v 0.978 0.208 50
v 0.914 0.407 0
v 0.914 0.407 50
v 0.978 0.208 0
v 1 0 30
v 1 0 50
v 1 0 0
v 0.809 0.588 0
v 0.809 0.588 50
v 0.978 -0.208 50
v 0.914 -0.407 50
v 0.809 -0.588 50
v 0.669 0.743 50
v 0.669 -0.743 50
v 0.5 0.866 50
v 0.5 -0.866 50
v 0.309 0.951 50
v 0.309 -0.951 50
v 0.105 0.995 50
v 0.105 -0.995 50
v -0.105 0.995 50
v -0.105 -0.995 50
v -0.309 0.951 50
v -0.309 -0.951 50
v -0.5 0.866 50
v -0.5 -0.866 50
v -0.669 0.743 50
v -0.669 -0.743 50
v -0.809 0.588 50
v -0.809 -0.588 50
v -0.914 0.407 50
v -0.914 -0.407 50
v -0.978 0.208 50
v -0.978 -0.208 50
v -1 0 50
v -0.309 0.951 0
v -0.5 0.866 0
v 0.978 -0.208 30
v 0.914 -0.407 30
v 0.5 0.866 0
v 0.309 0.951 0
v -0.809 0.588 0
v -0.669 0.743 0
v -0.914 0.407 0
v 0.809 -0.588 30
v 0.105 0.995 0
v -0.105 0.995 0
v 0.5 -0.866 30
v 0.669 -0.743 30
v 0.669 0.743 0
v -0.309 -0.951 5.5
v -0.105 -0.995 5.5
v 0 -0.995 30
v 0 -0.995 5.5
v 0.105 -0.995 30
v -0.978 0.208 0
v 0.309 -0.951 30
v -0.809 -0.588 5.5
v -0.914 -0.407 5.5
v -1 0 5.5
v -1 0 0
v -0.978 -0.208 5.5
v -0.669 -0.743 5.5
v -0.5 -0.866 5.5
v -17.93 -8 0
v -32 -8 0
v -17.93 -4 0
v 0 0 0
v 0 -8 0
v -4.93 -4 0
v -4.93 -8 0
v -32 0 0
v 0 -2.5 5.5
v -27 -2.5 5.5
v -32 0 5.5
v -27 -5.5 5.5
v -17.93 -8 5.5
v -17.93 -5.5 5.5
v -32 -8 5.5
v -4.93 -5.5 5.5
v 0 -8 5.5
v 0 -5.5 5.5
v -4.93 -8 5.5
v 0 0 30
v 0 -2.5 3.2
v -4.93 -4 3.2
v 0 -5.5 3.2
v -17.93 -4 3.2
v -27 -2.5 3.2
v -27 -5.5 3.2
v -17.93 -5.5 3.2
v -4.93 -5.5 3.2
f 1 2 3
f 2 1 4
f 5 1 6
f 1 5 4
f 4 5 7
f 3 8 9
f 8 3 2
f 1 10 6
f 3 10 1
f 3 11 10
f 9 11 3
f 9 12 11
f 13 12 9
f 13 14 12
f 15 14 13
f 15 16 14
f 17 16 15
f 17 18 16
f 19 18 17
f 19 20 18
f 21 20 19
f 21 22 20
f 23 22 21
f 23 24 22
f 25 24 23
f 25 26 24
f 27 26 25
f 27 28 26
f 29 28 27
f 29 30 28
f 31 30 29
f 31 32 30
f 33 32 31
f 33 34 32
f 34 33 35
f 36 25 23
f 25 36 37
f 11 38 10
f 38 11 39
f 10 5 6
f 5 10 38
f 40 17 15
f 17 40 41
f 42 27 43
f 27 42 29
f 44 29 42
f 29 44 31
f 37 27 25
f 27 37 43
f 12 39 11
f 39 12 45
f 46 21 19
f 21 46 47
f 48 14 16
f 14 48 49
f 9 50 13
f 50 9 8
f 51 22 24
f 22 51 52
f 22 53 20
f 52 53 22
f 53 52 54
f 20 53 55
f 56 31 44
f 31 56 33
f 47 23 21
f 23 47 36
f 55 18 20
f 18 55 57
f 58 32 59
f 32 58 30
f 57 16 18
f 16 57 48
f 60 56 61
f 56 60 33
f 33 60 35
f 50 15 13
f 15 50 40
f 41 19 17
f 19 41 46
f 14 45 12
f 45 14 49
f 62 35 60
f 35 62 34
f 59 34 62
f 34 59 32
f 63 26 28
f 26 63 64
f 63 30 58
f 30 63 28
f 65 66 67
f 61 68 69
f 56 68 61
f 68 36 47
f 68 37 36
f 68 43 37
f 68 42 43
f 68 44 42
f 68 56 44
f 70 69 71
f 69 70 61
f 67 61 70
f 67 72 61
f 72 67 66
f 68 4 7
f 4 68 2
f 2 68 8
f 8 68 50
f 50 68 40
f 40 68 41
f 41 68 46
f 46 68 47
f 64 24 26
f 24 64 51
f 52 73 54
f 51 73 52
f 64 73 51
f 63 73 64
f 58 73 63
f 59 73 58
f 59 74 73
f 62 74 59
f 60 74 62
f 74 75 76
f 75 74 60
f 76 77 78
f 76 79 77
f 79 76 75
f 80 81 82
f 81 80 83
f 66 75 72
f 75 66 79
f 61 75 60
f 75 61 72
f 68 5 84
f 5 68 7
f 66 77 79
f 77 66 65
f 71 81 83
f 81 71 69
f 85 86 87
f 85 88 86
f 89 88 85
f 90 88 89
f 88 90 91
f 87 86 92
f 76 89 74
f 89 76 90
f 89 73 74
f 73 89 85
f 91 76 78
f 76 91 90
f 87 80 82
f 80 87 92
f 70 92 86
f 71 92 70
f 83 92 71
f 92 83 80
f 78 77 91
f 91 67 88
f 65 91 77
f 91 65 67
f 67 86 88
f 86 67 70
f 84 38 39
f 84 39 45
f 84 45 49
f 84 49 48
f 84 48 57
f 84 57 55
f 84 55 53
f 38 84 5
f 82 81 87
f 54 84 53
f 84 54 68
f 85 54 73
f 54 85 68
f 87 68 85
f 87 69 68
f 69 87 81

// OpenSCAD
// file: BoxCommon.scad
// Sum array members:
function suma(array,start,end) =
    (start==end)
    ? array[start]
    : suma(array, start+1, end) + array[start];
function e(clear,o) =// Add clear to demensions of o
     (is_list(clear)) ?
        [o.x+clear.x,o.y+clear.y,o.z+clear.z] :
        [o.x+clear,o.y+clear,o.z+clear];

function align(mode,here,center=true)=
    [ search(mode,"eErR")?here.x:(search(mode,"wWlL")?0:here.x/2),
    search(mode,"nN")?here.y:(search(mode,"sS")?0:here.y/2),
    search(mode,"tT")?here.z:(search(mode,"bB")?0:here.z/2)]-
    (center?[here.x/2,here.y/2, here.z/2]:[0,0,0]);


module cubeXY(cc)
{
    translate([-cc.x/2,-cc.y/2, 0]) cube(cc,center=false);
}


// The size of the block that holds the display. Determines width.
DISPBLOCK=[16+50.2*3,44,15]; // Z is arbitrary at the moment

// The real size of the front panel
panelDim=[DISPBLOCK.x,DISPBLOCK.y,0]+[20,70,3.2];
lipHt=10;
outsideR=10;

// FF=Fudge Factor

DMM_BOARD_X=66 ; // 63 NO FF FROM DRAWING
DMM_BOARD_Y=3 ; // 1.6 NO FF Measured
//DMM_Center=[50,-20,0];
CPU_BOARD_X=54;
CPU_BOARD_Y=3;
CPU_BOARD_Z=102;


// Extra board locations relative to the DMM board:
CPU_Board_Loc=[0,27,6];  // Not using full width of the board
// loc is offset left to miss drilling the screw block.
IF_Board_Loc=[0,15,6];
boards=[[0,0,0],IF_Board_Loc,CPU_Board_Loc];


S_VO_OFFS=-19.08; // From drawing
S_Widths=14; // FROM Drawing
// Places 5A jack at edge of board.:
S_FUDGE=DMM_BOARD_X/2-S_Widths*2-2; 
S1=-S_Widths/2+S_FUDGE;
S0=S_VO_OFFS+S1;
S2=S_Widths/2+S_FUDGE; 
S3=S2+S_Widths;
DMM_JAX_X=[S0,S1,S2,S3];

// STack up to C/L of jack in Y - Measured terms
DMM_JAX_Y=DMM_BOARD_Y/2+4.9+5.5/2; 
DMM_JAX_LOWER_DIA=12; // Measured
DMM_JAX_UPPER_DIA=15; // Same as S_Widths
DMM_JAX_Z_OFFS=3.3 ; // How much of the lower shoulder shows.

for (i=[DMM_JAX_X])
    echo(i);
echo(DMM_JAX_Y);
// main file
include <BoxCommon.scad>;
$fs=.01;
// This is going to look upside down because of
// coordinate system for the board is from the front.
// Whereas this view is from the back. Its all
// flipped on the x axis.


BlockSZ=[54+10,8,5.5]; //  Of the board holders

// Locate the connectors on the back of the board
BRD_Center_X=53.34/2; // from either edge.
PWR_Center_X=BRD_Center_X-8.38; // Offset from center
USB_Center_X=BRD_Center_X-38.1;  // to center

USB_SZ=[13,12,50];
PWR_SZ=[10,12,50];



// Use these modules with the same translate parameters
module DMM_Back_U() // Really, just the cpu.
{  

    
   translate([0,-BlockSZ.y/2,BlockSZ.z/2]) cube(BlockSZ,center=true);
   
}
module DMM_Back_D()
{
    translate([0,0,panelDim.z])
    {
                     // The board is centered on 0,0 and 0 above z
        translate([0,-4,20/2])
         {
             cube([CPU_BOARD_X, CPU_BOARD_Y,20],center=true);
             translate([USB_Center_X,-USB_SZ.y/2,0])
                cube(USB_SZ,center=true);
             translate([PWR_Center_X,-PWR_SZ.y/2,0])
                cube(PWR_SZ,center=true);         }
      }

    
}
difference()
{
     union(){
        cylinder(r=1,h=50);
        DMM_Back_U();
     }
    DMM_Back_D();
    translate([0,-50,0]) cube([50,50,30]);
}
